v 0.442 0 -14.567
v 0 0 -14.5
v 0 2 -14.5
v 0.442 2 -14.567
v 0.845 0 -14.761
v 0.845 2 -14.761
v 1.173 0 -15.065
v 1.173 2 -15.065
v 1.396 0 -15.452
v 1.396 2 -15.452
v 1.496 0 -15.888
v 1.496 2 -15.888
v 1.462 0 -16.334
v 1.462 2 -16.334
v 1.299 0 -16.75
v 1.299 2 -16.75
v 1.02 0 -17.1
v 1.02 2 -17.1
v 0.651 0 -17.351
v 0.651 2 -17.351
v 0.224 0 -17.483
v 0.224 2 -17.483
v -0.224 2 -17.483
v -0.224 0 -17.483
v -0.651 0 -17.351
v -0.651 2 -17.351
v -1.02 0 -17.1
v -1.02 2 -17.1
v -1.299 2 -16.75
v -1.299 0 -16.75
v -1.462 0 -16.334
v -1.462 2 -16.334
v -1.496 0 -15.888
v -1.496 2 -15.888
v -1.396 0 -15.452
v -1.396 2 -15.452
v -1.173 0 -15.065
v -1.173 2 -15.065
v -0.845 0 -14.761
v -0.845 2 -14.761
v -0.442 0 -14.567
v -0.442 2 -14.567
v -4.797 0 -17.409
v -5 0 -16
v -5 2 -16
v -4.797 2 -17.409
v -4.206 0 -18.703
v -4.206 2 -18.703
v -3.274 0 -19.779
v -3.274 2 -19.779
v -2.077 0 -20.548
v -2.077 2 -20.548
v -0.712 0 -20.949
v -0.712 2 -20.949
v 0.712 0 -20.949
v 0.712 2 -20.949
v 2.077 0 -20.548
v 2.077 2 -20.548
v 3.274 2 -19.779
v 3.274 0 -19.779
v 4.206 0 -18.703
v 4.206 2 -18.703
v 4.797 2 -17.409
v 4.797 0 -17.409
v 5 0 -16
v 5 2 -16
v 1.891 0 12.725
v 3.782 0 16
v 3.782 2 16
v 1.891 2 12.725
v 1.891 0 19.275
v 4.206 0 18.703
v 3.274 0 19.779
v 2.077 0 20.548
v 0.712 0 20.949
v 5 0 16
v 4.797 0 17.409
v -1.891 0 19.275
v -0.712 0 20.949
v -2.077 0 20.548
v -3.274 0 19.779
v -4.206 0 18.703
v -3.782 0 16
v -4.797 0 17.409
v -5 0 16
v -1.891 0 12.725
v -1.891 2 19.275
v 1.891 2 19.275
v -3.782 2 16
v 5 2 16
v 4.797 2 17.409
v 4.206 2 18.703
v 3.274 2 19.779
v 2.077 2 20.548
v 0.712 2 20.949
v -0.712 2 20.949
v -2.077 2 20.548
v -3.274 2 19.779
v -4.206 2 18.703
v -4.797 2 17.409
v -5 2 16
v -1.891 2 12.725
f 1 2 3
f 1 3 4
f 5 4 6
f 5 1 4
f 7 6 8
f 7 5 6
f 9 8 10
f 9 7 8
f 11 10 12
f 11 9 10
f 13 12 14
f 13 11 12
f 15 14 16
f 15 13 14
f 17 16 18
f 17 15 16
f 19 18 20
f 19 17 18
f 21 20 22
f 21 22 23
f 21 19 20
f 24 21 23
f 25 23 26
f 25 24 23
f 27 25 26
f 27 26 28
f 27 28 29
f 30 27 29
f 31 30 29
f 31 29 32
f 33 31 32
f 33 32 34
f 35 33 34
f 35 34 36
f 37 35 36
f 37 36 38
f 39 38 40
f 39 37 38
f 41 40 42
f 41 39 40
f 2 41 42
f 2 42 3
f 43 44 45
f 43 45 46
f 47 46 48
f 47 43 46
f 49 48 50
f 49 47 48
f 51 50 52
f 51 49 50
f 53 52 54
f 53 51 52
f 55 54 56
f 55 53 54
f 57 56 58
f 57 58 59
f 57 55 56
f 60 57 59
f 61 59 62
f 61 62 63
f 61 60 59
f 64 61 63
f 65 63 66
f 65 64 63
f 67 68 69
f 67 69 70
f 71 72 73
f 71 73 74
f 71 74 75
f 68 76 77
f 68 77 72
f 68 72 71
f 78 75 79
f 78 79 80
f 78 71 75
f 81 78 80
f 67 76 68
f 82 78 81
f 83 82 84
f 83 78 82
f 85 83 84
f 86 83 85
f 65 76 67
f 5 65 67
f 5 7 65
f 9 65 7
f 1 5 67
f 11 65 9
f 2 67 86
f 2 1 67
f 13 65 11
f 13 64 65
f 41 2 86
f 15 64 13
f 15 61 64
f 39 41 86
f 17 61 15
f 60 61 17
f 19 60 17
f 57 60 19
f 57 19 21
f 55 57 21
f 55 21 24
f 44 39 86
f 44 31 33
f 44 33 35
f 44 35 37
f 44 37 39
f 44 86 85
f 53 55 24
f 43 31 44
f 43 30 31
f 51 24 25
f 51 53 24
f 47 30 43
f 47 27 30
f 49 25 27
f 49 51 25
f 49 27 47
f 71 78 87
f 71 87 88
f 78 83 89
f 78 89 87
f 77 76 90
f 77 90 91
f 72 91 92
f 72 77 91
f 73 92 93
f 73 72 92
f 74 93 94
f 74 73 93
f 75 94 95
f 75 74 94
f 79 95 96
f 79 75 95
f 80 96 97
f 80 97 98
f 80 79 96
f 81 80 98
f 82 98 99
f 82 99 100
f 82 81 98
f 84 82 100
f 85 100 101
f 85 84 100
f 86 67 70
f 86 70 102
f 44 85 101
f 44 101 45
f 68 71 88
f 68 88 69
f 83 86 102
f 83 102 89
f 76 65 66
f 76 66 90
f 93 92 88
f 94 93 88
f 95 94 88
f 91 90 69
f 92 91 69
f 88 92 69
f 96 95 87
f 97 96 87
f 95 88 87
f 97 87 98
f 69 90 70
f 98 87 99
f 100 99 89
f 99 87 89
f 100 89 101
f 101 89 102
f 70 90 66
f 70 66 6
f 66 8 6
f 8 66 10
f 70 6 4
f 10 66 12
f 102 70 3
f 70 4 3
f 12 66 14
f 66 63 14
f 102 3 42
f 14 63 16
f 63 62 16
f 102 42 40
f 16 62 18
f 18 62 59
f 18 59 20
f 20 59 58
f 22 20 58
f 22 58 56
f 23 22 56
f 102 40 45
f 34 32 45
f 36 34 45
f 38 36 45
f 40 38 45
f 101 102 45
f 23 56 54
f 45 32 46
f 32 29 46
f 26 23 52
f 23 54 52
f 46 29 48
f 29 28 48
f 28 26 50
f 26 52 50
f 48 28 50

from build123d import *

# Parameters (mm, degrees)
SKETCH_1_R      = 1.5
EXTRUDE_1_DEPTH = 2


with BuildPart() as part:
    # 草图1 → 凸台-拉伸1 (new body)
    with BuildSketch(Plane(origin=(0, 0, 0), x_dir=(1, 0, 0), z_dir=(0, 1, 0))):
        with BuildLine():
            Line((-5, -16), (-5, 16))
            ThreePointArc((-5, 16), (0, 21), (5, 16))
            Line((5, 16), (5, -16))
            ThreePointArc((5, -16), (0, -21), (-5, -16))
        make_face()
        with Locations(Location((0, 16, 0), (0, 0, 270))):
            Circle(SKETCH_1_R, mode=Mode.SUBTRACT)
        Polygon((1.890822132, -12.725), (-1.890822132, -12.725), (-3.781644263, -16), (-1.890822132, -19.275), (1.890822132, -19.275), (3.781644263, -16), align=None, mode=Mode.SUBTRACT)
    extrude(amount=EXTRUDE_1_DEPTH)


solid = part.part
